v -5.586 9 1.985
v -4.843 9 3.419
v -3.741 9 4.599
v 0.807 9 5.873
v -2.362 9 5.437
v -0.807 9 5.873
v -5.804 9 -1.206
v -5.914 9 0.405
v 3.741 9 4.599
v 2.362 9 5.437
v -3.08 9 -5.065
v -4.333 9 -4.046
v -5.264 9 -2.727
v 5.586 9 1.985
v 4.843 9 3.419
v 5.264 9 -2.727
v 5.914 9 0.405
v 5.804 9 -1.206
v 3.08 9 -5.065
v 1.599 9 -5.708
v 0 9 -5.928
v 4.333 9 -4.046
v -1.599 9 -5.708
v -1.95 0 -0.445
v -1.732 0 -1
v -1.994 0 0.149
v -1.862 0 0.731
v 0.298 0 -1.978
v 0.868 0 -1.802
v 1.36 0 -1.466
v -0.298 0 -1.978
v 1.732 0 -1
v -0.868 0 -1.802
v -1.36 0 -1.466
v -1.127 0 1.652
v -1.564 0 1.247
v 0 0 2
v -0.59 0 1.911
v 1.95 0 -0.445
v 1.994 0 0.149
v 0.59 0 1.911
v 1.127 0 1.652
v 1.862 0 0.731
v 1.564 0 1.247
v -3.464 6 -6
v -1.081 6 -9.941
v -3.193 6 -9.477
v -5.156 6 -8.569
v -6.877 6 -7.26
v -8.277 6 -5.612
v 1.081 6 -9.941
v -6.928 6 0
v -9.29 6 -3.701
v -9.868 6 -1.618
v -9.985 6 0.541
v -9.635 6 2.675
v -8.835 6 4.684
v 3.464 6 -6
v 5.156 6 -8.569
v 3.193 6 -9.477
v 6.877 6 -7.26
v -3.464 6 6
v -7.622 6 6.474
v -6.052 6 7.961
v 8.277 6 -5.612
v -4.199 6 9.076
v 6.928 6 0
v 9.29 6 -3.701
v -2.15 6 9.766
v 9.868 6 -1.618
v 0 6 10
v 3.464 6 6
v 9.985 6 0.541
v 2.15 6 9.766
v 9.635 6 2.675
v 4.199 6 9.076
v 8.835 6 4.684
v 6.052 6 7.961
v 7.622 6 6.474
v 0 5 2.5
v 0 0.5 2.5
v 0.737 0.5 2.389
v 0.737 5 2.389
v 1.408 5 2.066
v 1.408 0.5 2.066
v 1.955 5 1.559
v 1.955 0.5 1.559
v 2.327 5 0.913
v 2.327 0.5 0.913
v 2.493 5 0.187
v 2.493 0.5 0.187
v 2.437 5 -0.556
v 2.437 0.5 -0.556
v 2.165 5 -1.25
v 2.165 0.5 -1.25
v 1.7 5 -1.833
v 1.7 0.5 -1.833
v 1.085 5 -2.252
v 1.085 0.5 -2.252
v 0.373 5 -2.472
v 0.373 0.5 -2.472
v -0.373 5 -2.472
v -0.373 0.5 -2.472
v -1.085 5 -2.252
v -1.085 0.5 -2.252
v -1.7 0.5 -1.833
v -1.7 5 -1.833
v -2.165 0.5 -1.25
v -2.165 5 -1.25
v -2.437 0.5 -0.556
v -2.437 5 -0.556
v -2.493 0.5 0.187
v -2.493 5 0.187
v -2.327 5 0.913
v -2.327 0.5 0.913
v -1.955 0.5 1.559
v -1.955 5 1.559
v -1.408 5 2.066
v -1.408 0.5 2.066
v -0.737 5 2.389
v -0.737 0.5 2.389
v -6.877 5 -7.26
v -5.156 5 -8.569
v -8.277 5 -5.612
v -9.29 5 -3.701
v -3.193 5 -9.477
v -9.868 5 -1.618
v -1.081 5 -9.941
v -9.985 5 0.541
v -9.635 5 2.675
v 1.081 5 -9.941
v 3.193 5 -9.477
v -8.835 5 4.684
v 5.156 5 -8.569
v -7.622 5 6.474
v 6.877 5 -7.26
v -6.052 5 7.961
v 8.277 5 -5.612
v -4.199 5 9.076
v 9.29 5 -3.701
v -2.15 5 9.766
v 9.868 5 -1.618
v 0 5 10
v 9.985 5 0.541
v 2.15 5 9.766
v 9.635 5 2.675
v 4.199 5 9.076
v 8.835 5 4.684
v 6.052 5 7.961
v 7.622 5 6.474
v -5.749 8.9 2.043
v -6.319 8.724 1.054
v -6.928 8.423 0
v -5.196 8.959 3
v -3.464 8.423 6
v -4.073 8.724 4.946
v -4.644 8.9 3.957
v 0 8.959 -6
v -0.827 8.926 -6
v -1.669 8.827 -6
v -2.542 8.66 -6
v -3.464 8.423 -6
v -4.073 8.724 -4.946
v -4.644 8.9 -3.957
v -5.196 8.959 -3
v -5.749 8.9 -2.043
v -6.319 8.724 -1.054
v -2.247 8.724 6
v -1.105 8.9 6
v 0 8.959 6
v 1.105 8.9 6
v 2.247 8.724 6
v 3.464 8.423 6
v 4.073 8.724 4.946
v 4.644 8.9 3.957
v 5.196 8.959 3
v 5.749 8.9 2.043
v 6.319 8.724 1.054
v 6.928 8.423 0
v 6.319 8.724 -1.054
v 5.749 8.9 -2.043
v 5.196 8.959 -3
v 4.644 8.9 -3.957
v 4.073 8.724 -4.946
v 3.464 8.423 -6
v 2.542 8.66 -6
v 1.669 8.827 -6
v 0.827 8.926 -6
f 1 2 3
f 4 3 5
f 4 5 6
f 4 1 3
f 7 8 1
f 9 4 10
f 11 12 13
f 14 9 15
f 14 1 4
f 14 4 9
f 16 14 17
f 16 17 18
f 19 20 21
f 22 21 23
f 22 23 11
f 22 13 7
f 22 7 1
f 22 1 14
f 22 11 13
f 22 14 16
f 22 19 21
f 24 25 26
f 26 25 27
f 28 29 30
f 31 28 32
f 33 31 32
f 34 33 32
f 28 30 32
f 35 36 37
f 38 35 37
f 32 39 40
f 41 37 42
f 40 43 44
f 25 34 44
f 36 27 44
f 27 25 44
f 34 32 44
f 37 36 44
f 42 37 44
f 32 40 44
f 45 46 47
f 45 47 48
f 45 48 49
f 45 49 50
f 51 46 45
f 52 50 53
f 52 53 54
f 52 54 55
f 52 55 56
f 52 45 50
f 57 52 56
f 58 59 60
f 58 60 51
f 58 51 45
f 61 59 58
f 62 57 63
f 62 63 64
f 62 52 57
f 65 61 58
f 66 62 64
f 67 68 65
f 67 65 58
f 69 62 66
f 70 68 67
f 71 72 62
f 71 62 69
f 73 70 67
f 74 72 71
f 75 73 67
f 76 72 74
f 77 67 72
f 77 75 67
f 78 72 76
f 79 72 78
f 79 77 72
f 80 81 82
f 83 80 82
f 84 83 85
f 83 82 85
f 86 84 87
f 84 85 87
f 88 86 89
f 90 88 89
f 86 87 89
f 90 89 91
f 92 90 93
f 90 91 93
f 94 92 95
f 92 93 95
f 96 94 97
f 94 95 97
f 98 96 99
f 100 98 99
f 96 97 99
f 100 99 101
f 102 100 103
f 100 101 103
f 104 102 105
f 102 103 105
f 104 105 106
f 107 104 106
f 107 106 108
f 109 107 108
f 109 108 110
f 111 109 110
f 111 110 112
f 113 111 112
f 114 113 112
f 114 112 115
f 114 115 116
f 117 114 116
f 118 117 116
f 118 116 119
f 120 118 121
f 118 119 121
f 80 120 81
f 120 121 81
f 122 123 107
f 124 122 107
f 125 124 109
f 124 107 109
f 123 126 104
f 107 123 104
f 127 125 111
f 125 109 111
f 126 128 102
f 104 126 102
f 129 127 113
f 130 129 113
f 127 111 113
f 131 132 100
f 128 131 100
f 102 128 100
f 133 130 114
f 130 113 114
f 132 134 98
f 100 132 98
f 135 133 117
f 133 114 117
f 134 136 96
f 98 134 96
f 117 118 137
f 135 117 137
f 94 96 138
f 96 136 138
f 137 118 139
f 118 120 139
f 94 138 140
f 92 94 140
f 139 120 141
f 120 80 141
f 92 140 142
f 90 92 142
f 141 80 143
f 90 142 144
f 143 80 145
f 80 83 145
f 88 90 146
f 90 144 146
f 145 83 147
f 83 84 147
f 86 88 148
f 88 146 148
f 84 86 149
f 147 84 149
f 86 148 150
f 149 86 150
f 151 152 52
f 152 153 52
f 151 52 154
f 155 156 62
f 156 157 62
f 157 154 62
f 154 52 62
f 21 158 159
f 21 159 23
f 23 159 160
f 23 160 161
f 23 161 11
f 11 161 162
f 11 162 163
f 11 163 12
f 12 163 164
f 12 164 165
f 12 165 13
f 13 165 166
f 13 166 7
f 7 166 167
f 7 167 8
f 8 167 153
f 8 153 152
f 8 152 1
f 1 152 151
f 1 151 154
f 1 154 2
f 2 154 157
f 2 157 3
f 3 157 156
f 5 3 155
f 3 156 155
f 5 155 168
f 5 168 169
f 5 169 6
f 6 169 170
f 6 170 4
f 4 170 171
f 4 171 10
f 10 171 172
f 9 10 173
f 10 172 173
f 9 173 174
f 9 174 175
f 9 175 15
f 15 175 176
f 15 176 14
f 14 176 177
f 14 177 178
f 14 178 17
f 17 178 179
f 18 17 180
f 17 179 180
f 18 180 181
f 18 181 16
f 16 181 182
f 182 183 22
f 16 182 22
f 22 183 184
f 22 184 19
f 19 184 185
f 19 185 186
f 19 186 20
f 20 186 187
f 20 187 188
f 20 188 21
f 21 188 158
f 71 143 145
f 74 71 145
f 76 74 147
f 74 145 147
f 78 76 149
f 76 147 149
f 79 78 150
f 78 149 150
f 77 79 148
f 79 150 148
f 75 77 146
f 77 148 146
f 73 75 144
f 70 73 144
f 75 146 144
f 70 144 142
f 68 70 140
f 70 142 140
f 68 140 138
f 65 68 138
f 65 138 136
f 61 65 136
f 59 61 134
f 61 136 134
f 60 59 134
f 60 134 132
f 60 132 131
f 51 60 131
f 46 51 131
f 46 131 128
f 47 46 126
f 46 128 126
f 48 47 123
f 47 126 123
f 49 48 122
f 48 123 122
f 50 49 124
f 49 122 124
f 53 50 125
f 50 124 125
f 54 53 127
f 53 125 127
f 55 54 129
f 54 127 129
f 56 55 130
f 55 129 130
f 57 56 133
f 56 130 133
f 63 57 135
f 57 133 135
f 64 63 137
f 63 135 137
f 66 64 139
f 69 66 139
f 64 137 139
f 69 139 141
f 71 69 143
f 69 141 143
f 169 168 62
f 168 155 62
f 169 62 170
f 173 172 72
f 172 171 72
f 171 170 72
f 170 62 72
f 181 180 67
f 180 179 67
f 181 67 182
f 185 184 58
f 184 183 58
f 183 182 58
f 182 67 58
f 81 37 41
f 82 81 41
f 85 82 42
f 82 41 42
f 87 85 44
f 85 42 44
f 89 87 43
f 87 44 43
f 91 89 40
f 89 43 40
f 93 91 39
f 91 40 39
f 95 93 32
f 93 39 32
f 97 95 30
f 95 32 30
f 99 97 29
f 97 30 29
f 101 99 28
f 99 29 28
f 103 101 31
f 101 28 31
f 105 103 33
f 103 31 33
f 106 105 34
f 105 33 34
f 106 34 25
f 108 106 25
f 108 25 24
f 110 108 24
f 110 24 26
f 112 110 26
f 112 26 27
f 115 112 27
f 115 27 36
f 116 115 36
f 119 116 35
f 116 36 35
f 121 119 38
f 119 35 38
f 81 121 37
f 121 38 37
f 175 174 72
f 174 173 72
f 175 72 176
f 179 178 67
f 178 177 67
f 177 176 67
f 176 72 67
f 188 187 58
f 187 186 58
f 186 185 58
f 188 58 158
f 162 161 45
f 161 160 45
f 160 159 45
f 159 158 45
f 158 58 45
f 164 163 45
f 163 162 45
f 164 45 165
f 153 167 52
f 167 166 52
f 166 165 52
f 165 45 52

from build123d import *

# Parameters (mm, degrees)
SKETCH_2_R      = 2.5
EXTRUDE_1_DEPTH = 5
SKETCH_3_R      = 10
EXTRUDE_2_DEPTH = 1
EXTRUDE_3_DEPTH = 3
CHAMFER_1_SIZE  = 0.5


with BuildPart() as part:
    # 草图2 → 凸台-拉伸1 (new body)
    with BuildSketch(Plane(origin=(0, 0, 0), x_dir=(1, 0, 0), z_dir=(0, 1, 0))):
        with Locations(Location((0, 0, 0), (0, 0, 270))):
            Circle(SKETCH_2_R)
    extrude(amount=EXTRUDE_1_DEPTH)

    # 草图3 → 凸台-拉伸2 (add)
    with BuildSketch(Plane(origin=(0, 5, 0), x_dir=(1, 0, 0), z_dir=(0, 1, 0))):
        with Locations(Location((0, 0, 0), (0, 0, 270))):
            Circle(SKETCH_3_R)
    extrude(amount=EXTRUDE_2_DEPTH)

    # 草图4 → 凸台-拉伸3 (add)
    with BuildSketch(Plane(origin=(0, 6, 0), x_dir=(1, 0, 0), z_dir=(0, 1, 0))):
        Polygon((3.464101615, 6), (-3.464101615, 6), (-6.92820323, 0), (-3.464101615, -6), (3.464101615, -6), (6.92820323, 0), align=None)
    extrude(amount=EXTRUDE_3_DEPTH)

    # 草图8 → 切除-旋转1 (revolve, cut)
    with BuildSketch(Plane.XY, mode=Mode.PRIVATE) as cut_revolve_1_sk:
        Polygon((-6.92820323, 9), (-5.92820323, 9), (-6.92820323, 8.422649731), align=None)
    revolve(cut_revolve_1_sk.sketch.rotate(Axis((0, 0, 0), (0, 1, 0)), 270), axis=Axis((0, 0, 0), (0, 1, 0)), mode=Mode.SUBTRACT)

    # 倒角1
    chamfer_1_edges = [part.edges().sort_by_distance(p)[0] for p in [
        (0, 0, -2.5),
    ]]
    chamfer(chamfer_1_edges, length=CHAMFER_1_SIZE)


solid = part.part
